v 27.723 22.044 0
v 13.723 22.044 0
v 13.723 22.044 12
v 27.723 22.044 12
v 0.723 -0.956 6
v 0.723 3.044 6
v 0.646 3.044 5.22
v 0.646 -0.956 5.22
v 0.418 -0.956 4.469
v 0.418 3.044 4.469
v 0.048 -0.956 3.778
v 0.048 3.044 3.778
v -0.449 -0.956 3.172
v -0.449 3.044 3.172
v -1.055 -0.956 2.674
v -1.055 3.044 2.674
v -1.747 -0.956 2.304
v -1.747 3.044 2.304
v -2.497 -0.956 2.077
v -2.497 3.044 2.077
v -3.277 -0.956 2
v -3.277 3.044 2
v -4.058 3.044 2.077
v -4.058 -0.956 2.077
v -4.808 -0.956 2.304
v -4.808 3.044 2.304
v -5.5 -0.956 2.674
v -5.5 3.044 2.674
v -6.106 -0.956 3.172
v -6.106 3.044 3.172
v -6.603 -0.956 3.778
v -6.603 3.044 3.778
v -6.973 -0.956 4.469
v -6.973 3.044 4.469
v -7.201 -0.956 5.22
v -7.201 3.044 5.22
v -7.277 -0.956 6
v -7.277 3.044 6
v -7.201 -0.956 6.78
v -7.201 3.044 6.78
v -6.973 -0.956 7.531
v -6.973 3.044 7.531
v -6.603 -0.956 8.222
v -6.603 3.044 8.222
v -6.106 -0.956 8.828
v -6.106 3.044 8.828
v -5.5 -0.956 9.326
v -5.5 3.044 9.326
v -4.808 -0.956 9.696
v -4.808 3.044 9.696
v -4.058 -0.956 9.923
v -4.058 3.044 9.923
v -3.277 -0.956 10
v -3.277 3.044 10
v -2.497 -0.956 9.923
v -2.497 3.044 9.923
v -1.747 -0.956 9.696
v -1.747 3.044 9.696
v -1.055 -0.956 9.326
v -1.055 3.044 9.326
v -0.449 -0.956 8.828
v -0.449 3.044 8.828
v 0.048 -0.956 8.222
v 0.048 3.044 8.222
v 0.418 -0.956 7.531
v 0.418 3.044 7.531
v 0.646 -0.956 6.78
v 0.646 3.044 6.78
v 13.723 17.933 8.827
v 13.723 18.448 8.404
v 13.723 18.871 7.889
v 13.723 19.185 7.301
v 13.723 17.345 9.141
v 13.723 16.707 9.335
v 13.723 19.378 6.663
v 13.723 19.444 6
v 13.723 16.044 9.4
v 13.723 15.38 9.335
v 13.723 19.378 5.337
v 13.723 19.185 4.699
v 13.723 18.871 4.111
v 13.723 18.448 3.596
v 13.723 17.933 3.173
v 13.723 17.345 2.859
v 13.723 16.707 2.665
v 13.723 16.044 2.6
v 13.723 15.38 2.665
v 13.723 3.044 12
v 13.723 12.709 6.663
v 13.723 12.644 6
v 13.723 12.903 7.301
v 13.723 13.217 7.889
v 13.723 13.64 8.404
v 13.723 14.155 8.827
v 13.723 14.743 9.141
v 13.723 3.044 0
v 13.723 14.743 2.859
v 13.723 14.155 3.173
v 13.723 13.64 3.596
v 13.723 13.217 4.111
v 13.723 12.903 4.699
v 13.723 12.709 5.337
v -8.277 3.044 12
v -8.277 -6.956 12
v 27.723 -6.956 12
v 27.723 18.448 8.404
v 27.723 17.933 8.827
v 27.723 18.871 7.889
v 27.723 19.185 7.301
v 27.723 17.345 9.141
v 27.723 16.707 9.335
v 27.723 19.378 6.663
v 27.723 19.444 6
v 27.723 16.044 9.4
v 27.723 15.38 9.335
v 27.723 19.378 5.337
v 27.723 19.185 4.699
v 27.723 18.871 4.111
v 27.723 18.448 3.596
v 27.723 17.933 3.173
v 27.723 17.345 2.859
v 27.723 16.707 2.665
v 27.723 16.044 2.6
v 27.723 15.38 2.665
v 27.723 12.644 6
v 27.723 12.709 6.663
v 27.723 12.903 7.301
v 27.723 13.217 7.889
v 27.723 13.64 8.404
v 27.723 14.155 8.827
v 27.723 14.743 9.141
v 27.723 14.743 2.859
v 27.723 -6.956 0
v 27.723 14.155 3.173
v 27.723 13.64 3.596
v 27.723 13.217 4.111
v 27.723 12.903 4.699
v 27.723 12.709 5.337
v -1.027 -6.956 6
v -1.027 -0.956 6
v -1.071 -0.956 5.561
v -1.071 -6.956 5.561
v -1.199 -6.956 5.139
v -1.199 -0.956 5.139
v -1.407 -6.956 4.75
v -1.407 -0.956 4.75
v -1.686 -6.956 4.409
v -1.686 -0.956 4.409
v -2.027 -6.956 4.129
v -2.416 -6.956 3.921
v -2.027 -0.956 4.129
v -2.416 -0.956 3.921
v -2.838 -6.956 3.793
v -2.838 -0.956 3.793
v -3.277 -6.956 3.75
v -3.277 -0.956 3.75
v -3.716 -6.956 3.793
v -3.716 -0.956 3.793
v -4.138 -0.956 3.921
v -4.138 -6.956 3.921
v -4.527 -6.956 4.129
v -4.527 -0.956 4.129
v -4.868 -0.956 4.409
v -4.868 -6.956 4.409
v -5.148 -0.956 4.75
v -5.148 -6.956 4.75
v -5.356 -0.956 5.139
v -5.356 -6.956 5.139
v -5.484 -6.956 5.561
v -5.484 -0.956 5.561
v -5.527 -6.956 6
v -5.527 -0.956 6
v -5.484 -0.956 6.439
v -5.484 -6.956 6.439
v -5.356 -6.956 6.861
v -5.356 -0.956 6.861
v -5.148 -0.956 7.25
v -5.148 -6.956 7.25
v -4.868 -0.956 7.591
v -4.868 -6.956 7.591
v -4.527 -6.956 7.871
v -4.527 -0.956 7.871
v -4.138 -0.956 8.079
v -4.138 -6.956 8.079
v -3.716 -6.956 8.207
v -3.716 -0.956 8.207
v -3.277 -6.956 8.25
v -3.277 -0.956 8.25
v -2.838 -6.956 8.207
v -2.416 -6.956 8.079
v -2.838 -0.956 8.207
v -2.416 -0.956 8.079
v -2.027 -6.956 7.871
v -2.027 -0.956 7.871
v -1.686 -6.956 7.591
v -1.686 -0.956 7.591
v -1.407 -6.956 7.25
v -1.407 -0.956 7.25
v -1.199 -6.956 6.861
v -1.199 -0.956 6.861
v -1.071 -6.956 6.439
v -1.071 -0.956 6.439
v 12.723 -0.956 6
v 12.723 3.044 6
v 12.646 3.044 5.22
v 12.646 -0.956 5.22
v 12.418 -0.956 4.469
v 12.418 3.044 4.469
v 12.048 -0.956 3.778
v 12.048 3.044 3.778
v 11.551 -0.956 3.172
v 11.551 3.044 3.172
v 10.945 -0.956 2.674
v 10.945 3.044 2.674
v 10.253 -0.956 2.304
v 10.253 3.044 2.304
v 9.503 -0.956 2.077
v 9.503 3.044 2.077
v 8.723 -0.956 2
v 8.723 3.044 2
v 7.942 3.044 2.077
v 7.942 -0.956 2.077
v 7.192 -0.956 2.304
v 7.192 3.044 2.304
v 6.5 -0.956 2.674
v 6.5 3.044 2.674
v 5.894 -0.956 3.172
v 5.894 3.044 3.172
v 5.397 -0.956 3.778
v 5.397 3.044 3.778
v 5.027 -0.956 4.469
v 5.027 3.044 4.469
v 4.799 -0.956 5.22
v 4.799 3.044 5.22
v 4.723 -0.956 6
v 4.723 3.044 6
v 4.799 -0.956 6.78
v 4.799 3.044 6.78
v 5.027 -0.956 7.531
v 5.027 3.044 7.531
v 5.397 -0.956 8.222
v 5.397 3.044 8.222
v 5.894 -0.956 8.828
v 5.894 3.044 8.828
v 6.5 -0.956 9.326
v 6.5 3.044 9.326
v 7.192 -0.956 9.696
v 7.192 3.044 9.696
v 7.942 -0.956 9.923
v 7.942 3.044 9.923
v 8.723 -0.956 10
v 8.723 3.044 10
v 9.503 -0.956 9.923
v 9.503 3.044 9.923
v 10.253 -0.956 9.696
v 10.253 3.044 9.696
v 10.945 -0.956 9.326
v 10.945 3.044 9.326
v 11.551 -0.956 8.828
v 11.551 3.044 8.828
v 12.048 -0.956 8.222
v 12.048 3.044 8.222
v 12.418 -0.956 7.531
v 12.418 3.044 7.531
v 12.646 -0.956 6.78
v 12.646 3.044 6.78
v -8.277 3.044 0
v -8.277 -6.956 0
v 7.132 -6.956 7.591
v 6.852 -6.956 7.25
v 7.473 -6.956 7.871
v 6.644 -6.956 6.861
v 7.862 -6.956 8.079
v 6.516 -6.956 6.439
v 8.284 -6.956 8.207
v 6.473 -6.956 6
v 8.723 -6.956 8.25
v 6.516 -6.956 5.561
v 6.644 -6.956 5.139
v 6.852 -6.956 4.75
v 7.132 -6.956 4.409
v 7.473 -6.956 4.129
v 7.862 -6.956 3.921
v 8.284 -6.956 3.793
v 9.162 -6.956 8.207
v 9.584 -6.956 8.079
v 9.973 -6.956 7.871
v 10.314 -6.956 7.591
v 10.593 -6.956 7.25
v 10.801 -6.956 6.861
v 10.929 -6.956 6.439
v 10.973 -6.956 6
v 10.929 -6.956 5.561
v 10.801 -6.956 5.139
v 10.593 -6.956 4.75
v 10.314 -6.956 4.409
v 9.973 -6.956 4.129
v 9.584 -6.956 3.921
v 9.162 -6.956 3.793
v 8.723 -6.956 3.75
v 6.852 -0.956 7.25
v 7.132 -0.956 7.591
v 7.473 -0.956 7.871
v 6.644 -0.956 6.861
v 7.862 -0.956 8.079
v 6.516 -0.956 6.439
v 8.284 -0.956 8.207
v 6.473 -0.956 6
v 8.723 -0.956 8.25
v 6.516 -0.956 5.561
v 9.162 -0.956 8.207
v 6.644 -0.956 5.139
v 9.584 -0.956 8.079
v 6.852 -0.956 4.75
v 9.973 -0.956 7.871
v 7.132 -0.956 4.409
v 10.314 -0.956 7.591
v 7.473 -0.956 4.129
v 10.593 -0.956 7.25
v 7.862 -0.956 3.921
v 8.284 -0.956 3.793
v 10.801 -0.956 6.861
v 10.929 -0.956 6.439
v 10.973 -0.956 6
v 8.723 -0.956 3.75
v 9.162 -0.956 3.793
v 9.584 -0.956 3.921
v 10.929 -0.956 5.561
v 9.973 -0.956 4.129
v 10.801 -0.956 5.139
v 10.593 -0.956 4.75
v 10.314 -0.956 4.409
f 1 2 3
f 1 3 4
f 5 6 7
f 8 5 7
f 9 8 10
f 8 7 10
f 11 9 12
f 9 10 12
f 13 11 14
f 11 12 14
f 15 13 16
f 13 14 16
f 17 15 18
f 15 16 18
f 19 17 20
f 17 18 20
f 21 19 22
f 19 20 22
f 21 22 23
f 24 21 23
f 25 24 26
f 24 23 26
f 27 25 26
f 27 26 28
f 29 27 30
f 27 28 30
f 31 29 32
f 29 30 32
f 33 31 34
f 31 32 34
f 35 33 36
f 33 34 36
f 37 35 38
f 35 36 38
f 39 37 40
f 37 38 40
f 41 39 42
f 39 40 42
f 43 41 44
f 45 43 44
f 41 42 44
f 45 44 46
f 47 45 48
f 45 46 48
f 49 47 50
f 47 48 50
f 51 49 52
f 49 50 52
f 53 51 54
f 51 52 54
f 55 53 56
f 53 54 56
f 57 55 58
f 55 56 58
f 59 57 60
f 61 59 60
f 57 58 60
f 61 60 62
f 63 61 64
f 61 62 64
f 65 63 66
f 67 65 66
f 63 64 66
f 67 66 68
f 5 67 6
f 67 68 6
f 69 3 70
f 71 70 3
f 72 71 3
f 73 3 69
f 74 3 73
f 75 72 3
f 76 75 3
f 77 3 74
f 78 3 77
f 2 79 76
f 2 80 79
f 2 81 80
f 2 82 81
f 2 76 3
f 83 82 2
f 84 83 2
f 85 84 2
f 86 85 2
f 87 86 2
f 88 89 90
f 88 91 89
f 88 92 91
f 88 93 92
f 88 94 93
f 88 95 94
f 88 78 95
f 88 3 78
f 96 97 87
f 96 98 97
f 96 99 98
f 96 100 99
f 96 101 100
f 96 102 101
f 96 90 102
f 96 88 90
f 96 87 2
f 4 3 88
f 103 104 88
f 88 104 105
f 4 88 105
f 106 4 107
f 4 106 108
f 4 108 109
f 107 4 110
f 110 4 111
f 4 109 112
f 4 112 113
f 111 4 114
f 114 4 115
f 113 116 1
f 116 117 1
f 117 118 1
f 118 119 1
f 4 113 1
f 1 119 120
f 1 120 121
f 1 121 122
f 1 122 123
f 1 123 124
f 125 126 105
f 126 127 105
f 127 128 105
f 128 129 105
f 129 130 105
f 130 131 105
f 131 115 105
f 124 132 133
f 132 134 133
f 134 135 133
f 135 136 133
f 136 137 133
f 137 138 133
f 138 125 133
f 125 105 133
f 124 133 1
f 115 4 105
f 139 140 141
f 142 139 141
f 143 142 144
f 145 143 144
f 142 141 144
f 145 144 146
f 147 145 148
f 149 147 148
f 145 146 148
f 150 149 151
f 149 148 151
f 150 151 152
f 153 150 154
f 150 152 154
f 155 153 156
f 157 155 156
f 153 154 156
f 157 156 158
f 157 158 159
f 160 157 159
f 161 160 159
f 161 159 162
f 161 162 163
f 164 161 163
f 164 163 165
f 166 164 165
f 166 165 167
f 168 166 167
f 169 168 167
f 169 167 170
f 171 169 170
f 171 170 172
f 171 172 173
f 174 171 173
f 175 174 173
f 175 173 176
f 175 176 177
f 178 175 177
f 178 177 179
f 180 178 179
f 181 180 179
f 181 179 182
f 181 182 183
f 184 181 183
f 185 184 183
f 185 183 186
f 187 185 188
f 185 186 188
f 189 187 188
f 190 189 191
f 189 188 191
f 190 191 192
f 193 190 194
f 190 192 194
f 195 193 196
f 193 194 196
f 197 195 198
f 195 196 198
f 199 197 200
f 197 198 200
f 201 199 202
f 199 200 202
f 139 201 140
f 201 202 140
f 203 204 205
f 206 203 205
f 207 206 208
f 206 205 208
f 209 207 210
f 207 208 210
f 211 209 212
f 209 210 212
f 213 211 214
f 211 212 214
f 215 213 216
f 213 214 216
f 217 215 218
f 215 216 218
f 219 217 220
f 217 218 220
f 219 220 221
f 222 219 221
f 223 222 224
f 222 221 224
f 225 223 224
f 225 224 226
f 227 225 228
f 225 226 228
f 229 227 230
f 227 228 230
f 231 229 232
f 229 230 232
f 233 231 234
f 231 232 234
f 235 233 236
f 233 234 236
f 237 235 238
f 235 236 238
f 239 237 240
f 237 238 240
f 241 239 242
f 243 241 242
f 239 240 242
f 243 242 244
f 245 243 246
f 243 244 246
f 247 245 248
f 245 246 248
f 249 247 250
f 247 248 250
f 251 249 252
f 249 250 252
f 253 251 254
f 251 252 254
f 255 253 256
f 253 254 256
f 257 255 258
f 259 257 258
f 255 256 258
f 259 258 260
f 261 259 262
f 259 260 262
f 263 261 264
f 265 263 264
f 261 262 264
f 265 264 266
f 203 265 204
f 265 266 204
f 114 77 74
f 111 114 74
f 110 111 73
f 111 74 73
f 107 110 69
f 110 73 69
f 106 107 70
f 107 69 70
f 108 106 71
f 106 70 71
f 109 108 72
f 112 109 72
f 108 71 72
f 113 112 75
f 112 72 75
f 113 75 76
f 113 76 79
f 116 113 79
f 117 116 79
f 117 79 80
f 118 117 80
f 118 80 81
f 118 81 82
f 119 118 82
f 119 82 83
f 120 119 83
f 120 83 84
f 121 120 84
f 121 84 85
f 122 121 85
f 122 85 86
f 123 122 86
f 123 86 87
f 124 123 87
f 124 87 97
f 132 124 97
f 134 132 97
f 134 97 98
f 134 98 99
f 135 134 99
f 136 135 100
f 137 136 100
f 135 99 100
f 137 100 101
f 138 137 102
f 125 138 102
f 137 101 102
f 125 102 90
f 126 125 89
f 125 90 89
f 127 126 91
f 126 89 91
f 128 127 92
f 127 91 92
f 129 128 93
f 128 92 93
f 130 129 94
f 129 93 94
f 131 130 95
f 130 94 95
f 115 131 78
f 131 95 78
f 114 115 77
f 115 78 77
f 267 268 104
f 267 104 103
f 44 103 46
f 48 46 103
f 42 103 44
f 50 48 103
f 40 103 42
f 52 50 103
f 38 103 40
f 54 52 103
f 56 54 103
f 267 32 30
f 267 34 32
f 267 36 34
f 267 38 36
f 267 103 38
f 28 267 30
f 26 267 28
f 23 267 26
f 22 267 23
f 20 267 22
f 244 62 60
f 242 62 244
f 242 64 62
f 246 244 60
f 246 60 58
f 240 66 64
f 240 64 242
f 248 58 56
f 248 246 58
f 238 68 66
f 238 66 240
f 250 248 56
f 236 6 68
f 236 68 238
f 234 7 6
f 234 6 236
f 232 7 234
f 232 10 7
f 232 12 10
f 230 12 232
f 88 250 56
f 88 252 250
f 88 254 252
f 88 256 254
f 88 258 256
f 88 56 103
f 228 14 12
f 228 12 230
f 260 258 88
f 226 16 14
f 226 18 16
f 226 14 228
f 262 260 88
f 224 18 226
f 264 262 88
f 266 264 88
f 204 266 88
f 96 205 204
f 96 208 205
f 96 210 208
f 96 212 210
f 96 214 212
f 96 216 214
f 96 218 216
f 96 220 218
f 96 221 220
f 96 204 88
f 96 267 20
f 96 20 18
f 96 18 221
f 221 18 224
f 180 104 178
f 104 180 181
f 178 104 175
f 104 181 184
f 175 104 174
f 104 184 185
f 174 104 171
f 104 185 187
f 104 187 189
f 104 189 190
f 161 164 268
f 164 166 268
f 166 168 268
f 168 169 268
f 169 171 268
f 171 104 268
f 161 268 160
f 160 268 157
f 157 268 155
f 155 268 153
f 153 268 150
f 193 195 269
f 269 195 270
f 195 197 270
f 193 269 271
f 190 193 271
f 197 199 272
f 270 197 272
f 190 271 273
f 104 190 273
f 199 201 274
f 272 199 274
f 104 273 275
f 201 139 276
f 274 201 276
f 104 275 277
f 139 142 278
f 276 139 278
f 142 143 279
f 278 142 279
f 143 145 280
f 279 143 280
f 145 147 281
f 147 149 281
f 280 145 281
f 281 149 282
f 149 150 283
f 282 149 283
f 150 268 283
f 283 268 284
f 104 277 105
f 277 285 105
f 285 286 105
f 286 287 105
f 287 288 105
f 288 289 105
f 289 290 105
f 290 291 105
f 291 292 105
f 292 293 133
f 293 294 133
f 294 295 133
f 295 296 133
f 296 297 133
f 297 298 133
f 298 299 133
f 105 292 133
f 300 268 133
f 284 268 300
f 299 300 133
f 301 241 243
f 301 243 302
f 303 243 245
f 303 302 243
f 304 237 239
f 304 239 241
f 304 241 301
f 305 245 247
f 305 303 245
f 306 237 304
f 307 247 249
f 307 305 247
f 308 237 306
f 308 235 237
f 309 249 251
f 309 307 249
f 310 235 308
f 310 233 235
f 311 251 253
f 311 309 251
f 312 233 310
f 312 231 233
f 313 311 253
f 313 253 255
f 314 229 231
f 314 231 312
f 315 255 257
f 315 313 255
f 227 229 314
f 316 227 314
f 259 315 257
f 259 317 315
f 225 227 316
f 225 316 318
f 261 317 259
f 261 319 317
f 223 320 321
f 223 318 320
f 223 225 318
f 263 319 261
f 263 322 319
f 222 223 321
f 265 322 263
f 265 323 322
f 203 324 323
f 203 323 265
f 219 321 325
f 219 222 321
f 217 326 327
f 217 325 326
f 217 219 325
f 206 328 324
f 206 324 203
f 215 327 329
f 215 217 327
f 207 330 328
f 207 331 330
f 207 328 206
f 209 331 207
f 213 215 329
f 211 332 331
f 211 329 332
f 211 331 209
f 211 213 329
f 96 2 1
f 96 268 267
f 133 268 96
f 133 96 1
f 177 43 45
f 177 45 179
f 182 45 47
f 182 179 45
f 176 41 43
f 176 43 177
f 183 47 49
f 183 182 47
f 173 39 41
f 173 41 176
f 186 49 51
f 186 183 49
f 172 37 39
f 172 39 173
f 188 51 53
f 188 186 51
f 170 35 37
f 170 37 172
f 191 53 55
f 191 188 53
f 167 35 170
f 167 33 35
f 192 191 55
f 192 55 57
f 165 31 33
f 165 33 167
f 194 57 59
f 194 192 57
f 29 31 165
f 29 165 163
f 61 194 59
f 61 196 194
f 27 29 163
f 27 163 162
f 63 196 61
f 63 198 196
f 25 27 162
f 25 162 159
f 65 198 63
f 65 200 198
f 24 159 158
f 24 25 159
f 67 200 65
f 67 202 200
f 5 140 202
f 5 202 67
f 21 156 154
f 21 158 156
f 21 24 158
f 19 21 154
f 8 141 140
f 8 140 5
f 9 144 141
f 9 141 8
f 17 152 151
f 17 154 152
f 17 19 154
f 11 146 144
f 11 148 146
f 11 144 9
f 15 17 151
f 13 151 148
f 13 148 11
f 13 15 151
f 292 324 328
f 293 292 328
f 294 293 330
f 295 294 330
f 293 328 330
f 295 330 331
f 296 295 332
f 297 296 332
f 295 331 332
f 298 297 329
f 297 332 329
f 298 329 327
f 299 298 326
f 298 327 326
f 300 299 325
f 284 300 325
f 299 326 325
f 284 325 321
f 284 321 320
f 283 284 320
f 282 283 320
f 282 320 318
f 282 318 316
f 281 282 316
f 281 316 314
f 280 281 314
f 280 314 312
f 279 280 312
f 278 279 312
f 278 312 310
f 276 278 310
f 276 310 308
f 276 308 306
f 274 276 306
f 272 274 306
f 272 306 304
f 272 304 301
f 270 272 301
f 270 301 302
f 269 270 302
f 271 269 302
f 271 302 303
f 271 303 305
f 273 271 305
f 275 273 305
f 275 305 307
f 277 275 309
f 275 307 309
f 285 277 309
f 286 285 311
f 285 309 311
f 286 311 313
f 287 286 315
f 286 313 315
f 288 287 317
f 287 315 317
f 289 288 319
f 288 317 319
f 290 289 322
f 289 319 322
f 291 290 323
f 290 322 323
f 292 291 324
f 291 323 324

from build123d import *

# Parameters (mm, degrees)
SKETCH1_W             = 36
SKETCH1_H             = 10
BOSS_EXTRUDE1_DEPTH   = 12
SKETCH2_W             = 14
SKETCH2_H             = 12
BOSS_EXTRUDE2_DEPTH   = 19
SKETCH3_R             = 2.25
CUT_EXTRUDE1_DEPTH    = 11
SKETCH4_R             = 4
CUT_EXTRUDE2_DEPTH    = 4
M8_TAPPED_HOLE1_D     = 6.8
M8_TAPPED_HOLE1_DEPTH = 19.75
M8_TAPPED_HOLE1_TIP   = 2.042926105


with BuildPart() as part:
    # Sketch1 → Boss-Extrude1 (new body)
    with BuildSketch(Plane.XY):
        with Locations((9.722605043, -1.956268222)):
            Rectangle(SKETCH1_W, SKETCH1_H)
    extrude(amount=BOSS_EXTRUDE1_DEPTH)

    # Sketch2 → Boss-Extrude2 (add)
    with BuildSketch(Plane(origin=(0, 3.043731778, 0), x_dir=(1, 0, 0), z_dir=(0, 1, 0))):
        with Locations((20.722605043, -6)):
            Rectangle(SKETCH2_W, SKETCH2_H)
    extrude(amount=BOSS_EXTRUDE2_DEPTH)

    # Sketch3 → Cut-Extrude1 (cut, through all)
    with BuildSketch(Plane(origin=(0, 3.043731778, 0), x_dir=(1, 0, 0), z_dir=(0, 1, 0))):
        with Locations((-3.277394957, -6)):
            Circle(SKETCH3_R)
        with Locations((8.722605043, -6)):
            Circle(SKETCH3_R)
    extrude(amount=-CUT_EXTRUDE1_DEPTH, mode=Mode.SUBTRACT)

    # Sketch4 → Cut-Extrude2 (cut)
    with BuildSketch(Plane(origin=(0, 3.043731778, 0), x_dir=(1, 0, 0), z_dir=(0, 1, 0))):
        with Locations((-3.277394957, -6)):
            Circle(SKETCH4_R)
        with Locations((8.722605043, -6)):
            Circle(SKETCH4_R)
    extrude(amount=-CUT_EXTRUDE2_DEPTH, mode=Mode.SUBTRACT)

    # M8 Tapped Hole1
    with Locations(Plane(origin=(27.722605043, 0, 0), x_dir=(0, 0, -1), z_dir=(1, 0, 0))):
        with Locations((-6, 16.043731778)):
            Hole(M8_TAPPED_HOLE1_D / 2, depth=M8_TAPPED_HOLE1_DEPTH)
            with Locations((0, 0, -(M8_TAPPED_HOLE1_DEPTH + M8_TAPPED_HOLE1_TIP / 2))):  # 118° drill point
                Cone(0, M8_TAPPED_HOLE1_D / 2, M8_TAPPED_HOLE1_TIP, mode=Mode.SUBTRACT)


solid = part.part
